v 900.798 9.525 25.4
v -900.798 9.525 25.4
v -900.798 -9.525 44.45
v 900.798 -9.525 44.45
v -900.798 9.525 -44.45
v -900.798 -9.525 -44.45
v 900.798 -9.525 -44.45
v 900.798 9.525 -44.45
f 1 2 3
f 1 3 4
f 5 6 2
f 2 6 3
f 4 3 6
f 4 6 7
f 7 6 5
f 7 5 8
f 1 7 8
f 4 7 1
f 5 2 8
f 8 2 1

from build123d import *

# Parameters (mm, degrees)
F0_W     = 1801.5966
F0_H     = 88.9
F1_DEPTH = 9.525
F2_SIZE  = 19.04999


# Not quite as in the source:
# - a fillet or chamfer is up to 0.001 mm smaller than in the source, because OpenCascade refuses the exact size


with BuildPart() as f1:
    # F0 (on Front) → F1 (new body, symmetric)
    with BuildSketch(Plane.XZ):
        Rectangle(F0_W, F0_H)
    extrude(amount=F1_DEPTH, both=True)

    # F2 (size 19.05 in the source; OpenCascade refuses exactly that, so slightly less here)
    f2_edges = [f1.edges().sort_by_distance(p)[0] for p in [
        (0, 9.525, 44.45),
    ]]
    chamfer(f2_edges, length=F2_SIZE)


solid = f1.part
